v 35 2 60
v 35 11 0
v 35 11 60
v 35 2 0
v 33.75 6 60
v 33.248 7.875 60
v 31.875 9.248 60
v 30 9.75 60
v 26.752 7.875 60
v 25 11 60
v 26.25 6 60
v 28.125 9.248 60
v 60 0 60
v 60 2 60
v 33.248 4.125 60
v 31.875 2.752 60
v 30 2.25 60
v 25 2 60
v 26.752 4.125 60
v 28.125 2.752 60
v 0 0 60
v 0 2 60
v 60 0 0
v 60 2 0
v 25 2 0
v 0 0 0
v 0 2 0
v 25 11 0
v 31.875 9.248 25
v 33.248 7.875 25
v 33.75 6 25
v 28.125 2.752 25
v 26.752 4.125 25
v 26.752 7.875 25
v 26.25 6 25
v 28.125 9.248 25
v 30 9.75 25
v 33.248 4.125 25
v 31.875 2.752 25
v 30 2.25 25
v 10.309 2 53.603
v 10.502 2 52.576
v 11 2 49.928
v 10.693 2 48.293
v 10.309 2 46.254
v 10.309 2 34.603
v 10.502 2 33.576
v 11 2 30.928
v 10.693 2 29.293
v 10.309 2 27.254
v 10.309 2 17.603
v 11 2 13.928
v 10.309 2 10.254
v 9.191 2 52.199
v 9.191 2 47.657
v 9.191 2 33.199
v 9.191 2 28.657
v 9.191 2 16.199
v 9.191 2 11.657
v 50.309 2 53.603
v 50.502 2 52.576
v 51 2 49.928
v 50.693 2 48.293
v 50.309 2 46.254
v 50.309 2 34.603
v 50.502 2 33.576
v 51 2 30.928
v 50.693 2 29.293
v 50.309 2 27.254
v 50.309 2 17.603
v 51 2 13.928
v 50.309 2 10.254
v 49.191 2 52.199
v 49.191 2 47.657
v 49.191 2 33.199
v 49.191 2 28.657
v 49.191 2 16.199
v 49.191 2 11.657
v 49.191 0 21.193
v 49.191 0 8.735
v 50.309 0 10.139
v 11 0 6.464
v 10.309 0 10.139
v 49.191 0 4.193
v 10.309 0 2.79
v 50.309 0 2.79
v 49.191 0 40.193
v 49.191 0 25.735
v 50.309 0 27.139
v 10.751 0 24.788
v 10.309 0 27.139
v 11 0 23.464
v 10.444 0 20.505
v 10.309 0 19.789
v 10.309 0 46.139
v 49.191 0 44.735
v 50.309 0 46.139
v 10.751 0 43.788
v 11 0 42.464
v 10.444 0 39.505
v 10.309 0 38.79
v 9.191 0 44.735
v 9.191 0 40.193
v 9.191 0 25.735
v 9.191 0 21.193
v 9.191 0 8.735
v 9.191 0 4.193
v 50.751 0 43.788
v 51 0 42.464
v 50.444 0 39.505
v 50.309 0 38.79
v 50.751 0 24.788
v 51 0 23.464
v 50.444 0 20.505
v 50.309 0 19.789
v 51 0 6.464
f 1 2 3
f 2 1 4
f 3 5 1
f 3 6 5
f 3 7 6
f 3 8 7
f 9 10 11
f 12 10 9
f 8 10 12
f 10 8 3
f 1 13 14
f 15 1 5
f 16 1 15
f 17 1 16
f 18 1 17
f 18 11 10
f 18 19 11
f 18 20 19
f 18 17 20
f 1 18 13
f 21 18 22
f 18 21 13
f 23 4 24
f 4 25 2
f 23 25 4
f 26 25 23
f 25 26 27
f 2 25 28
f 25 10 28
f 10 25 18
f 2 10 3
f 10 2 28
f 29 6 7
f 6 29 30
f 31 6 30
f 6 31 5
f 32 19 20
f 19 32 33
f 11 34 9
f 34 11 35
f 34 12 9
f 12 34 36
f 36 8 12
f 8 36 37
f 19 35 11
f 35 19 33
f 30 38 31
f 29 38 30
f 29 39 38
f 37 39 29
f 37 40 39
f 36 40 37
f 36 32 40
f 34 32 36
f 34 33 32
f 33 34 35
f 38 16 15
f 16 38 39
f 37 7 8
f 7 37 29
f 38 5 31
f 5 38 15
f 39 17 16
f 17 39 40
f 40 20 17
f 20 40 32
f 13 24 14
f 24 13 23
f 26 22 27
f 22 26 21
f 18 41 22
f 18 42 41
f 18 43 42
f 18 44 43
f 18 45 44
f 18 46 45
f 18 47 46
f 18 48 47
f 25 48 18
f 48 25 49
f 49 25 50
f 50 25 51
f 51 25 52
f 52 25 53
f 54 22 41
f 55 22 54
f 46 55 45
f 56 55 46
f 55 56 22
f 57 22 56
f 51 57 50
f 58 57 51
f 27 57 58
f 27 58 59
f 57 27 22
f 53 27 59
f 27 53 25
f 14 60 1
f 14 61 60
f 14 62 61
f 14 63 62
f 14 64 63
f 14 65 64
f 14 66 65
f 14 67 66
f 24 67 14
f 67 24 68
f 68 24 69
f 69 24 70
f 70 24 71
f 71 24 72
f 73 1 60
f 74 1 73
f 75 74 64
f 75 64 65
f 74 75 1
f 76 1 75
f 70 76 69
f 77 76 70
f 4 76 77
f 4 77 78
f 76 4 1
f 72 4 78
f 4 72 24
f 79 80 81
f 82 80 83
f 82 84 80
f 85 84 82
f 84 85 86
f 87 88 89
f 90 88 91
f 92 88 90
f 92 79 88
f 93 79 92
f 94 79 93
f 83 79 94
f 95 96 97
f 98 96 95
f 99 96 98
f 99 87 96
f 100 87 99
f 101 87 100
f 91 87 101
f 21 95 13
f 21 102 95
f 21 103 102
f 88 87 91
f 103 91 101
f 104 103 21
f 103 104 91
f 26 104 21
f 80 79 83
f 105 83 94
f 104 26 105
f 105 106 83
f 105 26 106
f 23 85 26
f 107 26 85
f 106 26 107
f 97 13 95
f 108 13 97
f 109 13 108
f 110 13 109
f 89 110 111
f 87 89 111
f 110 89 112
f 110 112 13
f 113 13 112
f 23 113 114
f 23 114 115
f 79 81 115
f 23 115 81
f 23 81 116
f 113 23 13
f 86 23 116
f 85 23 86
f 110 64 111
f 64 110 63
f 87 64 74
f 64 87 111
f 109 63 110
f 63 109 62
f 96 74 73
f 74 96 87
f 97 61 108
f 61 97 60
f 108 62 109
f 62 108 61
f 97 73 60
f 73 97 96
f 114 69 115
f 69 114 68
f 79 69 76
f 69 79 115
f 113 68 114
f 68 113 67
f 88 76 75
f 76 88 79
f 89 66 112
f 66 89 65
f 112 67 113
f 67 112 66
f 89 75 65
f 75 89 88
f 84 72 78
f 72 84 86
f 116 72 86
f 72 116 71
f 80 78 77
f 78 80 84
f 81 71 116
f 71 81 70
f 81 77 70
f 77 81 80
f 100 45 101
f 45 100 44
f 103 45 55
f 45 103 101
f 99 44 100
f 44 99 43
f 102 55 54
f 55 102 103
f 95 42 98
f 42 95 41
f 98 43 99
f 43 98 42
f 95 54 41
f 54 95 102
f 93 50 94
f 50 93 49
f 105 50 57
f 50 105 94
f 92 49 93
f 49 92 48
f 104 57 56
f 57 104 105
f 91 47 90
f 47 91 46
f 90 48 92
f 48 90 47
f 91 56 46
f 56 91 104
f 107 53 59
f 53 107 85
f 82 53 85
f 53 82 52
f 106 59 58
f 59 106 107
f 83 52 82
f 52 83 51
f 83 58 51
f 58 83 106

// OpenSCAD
difference()
{
	translate([25,1,0]) cube([10,10,60]);
	translate([30,6,25]) cylinder(h=36,d=7.5);
}
difference()
{
	cube([60,2,60]);
	translate([50,-2,35]) rotate([-15,0,0]) cylinder(h=25,d=2);
	translate([50,-2,16]) rotate([-15,0,0]) cylinder(h=25,d=2);
	translate([50,-2,-1]) rotate([-15,0,0]) cylinder(h=25,d=2);
	translate([10,-2,35]) rotate([-15,0,0]) cylinder(h=25,d=2);
	translate([10,-2,16]) rotate([-15,0,0]) cylinder(h=25,d=2);
	translate([10,-2,-1]) rotate([-15,0,0]) cylinder(h=25,d=2);
}
